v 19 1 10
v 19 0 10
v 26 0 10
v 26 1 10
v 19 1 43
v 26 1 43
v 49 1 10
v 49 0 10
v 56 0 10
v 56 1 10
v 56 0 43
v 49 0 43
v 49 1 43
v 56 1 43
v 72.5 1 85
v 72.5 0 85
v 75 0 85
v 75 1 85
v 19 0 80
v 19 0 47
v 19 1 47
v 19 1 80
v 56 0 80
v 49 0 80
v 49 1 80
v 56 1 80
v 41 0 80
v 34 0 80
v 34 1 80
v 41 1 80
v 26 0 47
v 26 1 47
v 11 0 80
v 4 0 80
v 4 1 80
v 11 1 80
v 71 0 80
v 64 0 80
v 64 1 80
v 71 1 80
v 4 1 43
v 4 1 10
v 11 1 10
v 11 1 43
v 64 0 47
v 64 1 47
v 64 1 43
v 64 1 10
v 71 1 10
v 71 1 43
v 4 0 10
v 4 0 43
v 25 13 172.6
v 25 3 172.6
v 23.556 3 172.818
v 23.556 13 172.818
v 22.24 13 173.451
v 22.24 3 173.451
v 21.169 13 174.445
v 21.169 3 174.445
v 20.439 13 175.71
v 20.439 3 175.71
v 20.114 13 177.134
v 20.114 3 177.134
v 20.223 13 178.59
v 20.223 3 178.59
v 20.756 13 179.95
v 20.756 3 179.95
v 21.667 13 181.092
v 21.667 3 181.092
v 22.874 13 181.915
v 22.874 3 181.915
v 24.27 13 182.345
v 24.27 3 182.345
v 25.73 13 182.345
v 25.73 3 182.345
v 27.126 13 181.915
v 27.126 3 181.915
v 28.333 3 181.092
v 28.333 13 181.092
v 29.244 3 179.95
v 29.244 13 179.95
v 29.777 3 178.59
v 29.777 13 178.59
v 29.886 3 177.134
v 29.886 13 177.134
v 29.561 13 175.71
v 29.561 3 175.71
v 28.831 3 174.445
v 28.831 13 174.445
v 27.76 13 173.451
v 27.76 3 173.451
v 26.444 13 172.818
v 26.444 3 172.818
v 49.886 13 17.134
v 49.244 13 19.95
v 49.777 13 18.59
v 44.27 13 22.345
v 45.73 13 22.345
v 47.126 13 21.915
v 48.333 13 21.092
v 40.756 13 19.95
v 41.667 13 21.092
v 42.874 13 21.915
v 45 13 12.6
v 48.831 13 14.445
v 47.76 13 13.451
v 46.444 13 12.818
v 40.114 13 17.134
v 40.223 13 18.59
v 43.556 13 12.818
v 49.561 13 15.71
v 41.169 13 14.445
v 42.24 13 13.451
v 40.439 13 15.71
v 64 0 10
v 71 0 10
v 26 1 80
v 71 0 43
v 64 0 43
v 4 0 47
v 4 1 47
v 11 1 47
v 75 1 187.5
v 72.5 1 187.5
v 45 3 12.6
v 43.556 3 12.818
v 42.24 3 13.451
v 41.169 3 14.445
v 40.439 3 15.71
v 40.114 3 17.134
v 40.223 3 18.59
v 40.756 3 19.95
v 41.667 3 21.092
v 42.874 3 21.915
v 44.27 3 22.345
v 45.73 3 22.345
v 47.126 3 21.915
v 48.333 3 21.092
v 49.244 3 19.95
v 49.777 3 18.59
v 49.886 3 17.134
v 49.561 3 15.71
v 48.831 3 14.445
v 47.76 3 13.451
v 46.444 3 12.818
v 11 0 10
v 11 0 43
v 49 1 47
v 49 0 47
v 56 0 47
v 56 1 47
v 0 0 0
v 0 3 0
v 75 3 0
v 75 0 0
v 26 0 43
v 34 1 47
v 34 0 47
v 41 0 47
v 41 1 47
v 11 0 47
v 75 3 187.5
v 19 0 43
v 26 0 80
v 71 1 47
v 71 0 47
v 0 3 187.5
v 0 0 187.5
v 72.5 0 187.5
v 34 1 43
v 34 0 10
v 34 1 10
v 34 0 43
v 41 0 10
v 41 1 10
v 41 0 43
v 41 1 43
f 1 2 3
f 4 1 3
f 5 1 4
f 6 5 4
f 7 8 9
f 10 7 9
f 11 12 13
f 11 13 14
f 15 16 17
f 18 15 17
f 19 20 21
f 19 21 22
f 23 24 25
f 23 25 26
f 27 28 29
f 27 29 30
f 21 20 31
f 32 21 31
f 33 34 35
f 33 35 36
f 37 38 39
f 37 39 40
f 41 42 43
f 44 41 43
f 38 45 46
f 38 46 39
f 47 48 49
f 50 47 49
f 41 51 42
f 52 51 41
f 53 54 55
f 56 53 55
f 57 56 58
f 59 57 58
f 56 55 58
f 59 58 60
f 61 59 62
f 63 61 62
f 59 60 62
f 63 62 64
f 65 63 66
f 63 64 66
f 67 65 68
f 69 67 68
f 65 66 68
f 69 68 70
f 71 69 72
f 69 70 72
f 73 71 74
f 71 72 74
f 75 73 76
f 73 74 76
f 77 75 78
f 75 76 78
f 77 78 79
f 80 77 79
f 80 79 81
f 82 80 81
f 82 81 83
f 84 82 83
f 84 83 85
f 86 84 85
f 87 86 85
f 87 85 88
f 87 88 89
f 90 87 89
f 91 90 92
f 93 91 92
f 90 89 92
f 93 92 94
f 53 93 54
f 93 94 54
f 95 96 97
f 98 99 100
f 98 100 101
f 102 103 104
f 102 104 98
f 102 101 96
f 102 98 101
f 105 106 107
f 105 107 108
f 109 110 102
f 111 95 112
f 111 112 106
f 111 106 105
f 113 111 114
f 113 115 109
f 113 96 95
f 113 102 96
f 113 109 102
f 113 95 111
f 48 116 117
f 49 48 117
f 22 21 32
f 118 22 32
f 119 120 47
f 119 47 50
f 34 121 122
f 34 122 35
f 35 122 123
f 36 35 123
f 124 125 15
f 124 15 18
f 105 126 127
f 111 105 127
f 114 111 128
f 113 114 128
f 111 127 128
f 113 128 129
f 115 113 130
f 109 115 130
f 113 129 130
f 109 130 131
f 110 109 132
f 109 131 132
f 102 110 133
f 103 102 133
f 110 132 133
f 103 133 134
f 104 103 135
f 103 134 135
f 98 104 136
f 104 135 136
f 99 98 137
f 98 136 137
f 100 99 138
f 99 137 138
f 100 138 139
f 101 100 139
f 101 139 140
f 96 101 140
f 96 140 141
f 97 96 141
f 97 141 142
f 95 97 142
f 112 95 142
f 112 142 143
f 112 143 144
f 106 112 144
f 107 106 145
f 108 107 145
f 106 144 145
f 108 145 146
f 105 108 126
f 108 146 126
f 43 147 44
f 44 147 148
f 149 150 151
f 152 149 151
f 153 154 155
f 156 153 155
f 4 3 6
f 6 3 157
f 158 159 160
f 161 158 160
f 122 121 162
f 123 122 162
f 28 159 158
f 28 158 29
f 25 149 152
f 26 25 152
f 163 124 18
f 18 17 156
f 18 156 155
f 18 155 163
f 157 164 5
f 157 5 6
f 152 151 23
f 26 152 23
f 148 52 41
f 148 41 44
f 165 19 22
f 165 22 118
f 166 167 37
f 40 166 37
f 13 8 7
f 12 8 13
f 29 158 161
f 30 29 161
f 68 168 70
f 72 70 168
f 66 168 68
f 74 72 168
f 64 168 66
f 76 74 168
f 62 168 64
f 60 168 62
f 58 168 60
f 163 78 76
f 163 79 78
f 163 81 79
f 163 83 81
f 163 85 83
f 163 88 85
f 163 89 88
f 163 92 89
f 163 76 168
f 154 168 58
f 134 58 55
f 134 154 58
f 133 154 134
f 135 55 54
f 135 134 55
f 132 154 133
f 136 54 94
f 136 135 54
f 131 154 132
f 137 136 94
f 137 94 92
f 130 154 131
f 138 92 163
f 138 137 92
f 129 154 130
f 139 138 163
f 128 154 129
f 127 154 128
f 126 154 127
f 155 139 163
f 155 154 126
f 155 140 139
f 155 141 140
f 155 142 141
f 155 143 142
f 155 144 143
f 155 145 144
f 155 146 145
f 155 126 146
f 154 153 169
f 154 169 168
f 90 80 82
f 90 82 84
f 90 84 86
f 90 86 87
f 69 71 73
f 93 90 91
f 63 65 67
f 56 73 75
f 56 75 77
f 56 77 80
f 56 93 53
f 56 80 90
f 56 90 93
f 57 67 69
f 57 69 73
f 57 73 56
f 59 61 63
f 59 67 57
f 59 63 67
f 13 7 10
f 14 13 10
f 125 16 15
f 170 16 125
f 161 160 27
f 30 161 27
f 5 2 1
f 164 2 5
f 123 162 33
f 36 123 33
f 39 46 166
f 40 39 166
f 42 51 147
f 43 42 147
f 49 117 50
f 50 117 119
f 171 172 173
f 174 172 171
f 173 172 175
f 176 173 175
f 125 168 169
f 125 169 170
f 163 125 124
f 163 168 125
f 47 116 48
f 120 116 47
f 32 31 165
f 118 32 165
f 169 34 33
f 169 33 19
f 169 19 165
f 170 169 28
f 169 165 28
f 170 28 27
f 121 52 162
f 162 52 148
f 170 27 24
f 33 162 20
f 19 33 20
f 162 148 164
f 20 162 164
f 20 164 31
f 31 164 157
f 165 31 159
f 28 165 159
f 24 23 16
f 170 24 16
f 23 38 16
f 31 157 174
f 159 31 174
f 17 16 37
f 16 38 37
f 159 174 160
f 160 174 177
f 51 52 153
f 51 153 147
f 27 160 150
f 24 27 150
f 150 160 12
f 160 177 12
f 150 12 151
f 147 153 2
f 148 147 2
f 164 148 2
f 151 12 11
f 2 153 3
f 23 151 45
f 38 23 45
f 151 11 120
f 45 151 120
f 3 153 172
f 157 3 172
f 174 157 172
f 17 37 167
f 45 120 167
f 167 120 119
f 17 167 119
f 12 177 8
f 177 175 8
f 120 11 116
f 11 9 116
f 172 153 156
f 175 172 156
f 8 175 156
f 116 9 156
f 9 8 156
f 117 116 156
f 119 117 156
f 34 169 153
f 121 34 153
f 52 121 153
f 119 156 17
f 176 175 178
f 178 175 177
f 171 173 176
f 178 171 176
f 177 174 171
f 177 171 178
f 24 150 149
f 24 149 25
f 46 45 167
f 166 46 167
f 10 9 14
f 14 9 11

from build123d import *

# Parameters (mm, degrees)
SKETCH1_W           = 75
SKETCH1_H           = 3
BOSS_EXTRUDE1_DEPTH = 187.5
SKETCH2_R           = 4.9
BOSS_EXTRUDE2_DEPTH = 10
SKETCH3_W           = 7
SKETCH3_H           = 33
SKETCH3_W_2         = 2.5
SKETCH3_H_2         = 102.5
CUT_EXTRUDE1_DEPTH  = 1


with BuildPart() as part:
    # Sketch1 → Boss-Extrude1 (new body)
    with BuildSketch(Plane.XY):
        with Locations((37.5, 1.5)):
            Rectangle(SKETCH1_W, SKETCH1_H)
    extrude(amount=BOSS_EXTRUDE1_DEPTH)

    # Sketch2 → Boss-Extrude2 (add)
    with BuildSketch(Plane(origin=(0, 3, 0), x_dir=(1, 0, 0), z_dir=(0, 1, 0))):
        with Locations(Location((25, -177.5, 0), (0, 0, 90))):
            Circle(SKETCH2_R)
        with Locations(Location((45, -17.5, 0), (0, 0, 90))):
            Circle(SKETCH2_R)
    extrude(amount=BOSS_EXTRUDE2_DEPTH)

    # Sketch3 → Cut-Extrude1 (cut)
    with BuildSketch(Plane.XZ):
        with Locations((7.5, 26.5)):
            Rectangle(SKETCH3_W, SKETCH3_H)
        with Locations((7.5, 63.5)):
            Rectangle(SKETCH3_W, SKETCH3_H)
        with Locations((22.5, 26.5)):
            Rectangle(SKETCH3_W, SKETCH3_H)
        with Locations((22.5, 63.5)):
            Rectangle(SKETCH3_W, SKETCH3_H)
        with Locations((37.5, 26.5)):
            Rectangle(SKETCH3_W, SKETCH3_H)
        with Locations((37.5, 63.5)):
            Rectangle(SKETCH3_W, SKETCH3_H)
        with Locations((52.5, 26.5)):
            Rectangle(SKETCH3_W, SKETCH3_H)
        with Locations((52.5, 63.5)):
            Rectangle(SKETCH3_W, SKETCH3_H)
        with Locations((67.5, 26.5)):
            Rectangle(SKETCH3_W, SKETCH3_H)
        with Locations((67.5, 63.5)):
            Rectangle(SKETCH3_W, SKETCH3_H)
        with Locations((73.75, 136.25)):
            Rectangle(SKETCH3_W_2, SKETCH3_H_2)
    extrude(amount=-CUT_EXTRUDE1_DEPTH, mode=Mode.SUBTRACT)


solid = part.part
